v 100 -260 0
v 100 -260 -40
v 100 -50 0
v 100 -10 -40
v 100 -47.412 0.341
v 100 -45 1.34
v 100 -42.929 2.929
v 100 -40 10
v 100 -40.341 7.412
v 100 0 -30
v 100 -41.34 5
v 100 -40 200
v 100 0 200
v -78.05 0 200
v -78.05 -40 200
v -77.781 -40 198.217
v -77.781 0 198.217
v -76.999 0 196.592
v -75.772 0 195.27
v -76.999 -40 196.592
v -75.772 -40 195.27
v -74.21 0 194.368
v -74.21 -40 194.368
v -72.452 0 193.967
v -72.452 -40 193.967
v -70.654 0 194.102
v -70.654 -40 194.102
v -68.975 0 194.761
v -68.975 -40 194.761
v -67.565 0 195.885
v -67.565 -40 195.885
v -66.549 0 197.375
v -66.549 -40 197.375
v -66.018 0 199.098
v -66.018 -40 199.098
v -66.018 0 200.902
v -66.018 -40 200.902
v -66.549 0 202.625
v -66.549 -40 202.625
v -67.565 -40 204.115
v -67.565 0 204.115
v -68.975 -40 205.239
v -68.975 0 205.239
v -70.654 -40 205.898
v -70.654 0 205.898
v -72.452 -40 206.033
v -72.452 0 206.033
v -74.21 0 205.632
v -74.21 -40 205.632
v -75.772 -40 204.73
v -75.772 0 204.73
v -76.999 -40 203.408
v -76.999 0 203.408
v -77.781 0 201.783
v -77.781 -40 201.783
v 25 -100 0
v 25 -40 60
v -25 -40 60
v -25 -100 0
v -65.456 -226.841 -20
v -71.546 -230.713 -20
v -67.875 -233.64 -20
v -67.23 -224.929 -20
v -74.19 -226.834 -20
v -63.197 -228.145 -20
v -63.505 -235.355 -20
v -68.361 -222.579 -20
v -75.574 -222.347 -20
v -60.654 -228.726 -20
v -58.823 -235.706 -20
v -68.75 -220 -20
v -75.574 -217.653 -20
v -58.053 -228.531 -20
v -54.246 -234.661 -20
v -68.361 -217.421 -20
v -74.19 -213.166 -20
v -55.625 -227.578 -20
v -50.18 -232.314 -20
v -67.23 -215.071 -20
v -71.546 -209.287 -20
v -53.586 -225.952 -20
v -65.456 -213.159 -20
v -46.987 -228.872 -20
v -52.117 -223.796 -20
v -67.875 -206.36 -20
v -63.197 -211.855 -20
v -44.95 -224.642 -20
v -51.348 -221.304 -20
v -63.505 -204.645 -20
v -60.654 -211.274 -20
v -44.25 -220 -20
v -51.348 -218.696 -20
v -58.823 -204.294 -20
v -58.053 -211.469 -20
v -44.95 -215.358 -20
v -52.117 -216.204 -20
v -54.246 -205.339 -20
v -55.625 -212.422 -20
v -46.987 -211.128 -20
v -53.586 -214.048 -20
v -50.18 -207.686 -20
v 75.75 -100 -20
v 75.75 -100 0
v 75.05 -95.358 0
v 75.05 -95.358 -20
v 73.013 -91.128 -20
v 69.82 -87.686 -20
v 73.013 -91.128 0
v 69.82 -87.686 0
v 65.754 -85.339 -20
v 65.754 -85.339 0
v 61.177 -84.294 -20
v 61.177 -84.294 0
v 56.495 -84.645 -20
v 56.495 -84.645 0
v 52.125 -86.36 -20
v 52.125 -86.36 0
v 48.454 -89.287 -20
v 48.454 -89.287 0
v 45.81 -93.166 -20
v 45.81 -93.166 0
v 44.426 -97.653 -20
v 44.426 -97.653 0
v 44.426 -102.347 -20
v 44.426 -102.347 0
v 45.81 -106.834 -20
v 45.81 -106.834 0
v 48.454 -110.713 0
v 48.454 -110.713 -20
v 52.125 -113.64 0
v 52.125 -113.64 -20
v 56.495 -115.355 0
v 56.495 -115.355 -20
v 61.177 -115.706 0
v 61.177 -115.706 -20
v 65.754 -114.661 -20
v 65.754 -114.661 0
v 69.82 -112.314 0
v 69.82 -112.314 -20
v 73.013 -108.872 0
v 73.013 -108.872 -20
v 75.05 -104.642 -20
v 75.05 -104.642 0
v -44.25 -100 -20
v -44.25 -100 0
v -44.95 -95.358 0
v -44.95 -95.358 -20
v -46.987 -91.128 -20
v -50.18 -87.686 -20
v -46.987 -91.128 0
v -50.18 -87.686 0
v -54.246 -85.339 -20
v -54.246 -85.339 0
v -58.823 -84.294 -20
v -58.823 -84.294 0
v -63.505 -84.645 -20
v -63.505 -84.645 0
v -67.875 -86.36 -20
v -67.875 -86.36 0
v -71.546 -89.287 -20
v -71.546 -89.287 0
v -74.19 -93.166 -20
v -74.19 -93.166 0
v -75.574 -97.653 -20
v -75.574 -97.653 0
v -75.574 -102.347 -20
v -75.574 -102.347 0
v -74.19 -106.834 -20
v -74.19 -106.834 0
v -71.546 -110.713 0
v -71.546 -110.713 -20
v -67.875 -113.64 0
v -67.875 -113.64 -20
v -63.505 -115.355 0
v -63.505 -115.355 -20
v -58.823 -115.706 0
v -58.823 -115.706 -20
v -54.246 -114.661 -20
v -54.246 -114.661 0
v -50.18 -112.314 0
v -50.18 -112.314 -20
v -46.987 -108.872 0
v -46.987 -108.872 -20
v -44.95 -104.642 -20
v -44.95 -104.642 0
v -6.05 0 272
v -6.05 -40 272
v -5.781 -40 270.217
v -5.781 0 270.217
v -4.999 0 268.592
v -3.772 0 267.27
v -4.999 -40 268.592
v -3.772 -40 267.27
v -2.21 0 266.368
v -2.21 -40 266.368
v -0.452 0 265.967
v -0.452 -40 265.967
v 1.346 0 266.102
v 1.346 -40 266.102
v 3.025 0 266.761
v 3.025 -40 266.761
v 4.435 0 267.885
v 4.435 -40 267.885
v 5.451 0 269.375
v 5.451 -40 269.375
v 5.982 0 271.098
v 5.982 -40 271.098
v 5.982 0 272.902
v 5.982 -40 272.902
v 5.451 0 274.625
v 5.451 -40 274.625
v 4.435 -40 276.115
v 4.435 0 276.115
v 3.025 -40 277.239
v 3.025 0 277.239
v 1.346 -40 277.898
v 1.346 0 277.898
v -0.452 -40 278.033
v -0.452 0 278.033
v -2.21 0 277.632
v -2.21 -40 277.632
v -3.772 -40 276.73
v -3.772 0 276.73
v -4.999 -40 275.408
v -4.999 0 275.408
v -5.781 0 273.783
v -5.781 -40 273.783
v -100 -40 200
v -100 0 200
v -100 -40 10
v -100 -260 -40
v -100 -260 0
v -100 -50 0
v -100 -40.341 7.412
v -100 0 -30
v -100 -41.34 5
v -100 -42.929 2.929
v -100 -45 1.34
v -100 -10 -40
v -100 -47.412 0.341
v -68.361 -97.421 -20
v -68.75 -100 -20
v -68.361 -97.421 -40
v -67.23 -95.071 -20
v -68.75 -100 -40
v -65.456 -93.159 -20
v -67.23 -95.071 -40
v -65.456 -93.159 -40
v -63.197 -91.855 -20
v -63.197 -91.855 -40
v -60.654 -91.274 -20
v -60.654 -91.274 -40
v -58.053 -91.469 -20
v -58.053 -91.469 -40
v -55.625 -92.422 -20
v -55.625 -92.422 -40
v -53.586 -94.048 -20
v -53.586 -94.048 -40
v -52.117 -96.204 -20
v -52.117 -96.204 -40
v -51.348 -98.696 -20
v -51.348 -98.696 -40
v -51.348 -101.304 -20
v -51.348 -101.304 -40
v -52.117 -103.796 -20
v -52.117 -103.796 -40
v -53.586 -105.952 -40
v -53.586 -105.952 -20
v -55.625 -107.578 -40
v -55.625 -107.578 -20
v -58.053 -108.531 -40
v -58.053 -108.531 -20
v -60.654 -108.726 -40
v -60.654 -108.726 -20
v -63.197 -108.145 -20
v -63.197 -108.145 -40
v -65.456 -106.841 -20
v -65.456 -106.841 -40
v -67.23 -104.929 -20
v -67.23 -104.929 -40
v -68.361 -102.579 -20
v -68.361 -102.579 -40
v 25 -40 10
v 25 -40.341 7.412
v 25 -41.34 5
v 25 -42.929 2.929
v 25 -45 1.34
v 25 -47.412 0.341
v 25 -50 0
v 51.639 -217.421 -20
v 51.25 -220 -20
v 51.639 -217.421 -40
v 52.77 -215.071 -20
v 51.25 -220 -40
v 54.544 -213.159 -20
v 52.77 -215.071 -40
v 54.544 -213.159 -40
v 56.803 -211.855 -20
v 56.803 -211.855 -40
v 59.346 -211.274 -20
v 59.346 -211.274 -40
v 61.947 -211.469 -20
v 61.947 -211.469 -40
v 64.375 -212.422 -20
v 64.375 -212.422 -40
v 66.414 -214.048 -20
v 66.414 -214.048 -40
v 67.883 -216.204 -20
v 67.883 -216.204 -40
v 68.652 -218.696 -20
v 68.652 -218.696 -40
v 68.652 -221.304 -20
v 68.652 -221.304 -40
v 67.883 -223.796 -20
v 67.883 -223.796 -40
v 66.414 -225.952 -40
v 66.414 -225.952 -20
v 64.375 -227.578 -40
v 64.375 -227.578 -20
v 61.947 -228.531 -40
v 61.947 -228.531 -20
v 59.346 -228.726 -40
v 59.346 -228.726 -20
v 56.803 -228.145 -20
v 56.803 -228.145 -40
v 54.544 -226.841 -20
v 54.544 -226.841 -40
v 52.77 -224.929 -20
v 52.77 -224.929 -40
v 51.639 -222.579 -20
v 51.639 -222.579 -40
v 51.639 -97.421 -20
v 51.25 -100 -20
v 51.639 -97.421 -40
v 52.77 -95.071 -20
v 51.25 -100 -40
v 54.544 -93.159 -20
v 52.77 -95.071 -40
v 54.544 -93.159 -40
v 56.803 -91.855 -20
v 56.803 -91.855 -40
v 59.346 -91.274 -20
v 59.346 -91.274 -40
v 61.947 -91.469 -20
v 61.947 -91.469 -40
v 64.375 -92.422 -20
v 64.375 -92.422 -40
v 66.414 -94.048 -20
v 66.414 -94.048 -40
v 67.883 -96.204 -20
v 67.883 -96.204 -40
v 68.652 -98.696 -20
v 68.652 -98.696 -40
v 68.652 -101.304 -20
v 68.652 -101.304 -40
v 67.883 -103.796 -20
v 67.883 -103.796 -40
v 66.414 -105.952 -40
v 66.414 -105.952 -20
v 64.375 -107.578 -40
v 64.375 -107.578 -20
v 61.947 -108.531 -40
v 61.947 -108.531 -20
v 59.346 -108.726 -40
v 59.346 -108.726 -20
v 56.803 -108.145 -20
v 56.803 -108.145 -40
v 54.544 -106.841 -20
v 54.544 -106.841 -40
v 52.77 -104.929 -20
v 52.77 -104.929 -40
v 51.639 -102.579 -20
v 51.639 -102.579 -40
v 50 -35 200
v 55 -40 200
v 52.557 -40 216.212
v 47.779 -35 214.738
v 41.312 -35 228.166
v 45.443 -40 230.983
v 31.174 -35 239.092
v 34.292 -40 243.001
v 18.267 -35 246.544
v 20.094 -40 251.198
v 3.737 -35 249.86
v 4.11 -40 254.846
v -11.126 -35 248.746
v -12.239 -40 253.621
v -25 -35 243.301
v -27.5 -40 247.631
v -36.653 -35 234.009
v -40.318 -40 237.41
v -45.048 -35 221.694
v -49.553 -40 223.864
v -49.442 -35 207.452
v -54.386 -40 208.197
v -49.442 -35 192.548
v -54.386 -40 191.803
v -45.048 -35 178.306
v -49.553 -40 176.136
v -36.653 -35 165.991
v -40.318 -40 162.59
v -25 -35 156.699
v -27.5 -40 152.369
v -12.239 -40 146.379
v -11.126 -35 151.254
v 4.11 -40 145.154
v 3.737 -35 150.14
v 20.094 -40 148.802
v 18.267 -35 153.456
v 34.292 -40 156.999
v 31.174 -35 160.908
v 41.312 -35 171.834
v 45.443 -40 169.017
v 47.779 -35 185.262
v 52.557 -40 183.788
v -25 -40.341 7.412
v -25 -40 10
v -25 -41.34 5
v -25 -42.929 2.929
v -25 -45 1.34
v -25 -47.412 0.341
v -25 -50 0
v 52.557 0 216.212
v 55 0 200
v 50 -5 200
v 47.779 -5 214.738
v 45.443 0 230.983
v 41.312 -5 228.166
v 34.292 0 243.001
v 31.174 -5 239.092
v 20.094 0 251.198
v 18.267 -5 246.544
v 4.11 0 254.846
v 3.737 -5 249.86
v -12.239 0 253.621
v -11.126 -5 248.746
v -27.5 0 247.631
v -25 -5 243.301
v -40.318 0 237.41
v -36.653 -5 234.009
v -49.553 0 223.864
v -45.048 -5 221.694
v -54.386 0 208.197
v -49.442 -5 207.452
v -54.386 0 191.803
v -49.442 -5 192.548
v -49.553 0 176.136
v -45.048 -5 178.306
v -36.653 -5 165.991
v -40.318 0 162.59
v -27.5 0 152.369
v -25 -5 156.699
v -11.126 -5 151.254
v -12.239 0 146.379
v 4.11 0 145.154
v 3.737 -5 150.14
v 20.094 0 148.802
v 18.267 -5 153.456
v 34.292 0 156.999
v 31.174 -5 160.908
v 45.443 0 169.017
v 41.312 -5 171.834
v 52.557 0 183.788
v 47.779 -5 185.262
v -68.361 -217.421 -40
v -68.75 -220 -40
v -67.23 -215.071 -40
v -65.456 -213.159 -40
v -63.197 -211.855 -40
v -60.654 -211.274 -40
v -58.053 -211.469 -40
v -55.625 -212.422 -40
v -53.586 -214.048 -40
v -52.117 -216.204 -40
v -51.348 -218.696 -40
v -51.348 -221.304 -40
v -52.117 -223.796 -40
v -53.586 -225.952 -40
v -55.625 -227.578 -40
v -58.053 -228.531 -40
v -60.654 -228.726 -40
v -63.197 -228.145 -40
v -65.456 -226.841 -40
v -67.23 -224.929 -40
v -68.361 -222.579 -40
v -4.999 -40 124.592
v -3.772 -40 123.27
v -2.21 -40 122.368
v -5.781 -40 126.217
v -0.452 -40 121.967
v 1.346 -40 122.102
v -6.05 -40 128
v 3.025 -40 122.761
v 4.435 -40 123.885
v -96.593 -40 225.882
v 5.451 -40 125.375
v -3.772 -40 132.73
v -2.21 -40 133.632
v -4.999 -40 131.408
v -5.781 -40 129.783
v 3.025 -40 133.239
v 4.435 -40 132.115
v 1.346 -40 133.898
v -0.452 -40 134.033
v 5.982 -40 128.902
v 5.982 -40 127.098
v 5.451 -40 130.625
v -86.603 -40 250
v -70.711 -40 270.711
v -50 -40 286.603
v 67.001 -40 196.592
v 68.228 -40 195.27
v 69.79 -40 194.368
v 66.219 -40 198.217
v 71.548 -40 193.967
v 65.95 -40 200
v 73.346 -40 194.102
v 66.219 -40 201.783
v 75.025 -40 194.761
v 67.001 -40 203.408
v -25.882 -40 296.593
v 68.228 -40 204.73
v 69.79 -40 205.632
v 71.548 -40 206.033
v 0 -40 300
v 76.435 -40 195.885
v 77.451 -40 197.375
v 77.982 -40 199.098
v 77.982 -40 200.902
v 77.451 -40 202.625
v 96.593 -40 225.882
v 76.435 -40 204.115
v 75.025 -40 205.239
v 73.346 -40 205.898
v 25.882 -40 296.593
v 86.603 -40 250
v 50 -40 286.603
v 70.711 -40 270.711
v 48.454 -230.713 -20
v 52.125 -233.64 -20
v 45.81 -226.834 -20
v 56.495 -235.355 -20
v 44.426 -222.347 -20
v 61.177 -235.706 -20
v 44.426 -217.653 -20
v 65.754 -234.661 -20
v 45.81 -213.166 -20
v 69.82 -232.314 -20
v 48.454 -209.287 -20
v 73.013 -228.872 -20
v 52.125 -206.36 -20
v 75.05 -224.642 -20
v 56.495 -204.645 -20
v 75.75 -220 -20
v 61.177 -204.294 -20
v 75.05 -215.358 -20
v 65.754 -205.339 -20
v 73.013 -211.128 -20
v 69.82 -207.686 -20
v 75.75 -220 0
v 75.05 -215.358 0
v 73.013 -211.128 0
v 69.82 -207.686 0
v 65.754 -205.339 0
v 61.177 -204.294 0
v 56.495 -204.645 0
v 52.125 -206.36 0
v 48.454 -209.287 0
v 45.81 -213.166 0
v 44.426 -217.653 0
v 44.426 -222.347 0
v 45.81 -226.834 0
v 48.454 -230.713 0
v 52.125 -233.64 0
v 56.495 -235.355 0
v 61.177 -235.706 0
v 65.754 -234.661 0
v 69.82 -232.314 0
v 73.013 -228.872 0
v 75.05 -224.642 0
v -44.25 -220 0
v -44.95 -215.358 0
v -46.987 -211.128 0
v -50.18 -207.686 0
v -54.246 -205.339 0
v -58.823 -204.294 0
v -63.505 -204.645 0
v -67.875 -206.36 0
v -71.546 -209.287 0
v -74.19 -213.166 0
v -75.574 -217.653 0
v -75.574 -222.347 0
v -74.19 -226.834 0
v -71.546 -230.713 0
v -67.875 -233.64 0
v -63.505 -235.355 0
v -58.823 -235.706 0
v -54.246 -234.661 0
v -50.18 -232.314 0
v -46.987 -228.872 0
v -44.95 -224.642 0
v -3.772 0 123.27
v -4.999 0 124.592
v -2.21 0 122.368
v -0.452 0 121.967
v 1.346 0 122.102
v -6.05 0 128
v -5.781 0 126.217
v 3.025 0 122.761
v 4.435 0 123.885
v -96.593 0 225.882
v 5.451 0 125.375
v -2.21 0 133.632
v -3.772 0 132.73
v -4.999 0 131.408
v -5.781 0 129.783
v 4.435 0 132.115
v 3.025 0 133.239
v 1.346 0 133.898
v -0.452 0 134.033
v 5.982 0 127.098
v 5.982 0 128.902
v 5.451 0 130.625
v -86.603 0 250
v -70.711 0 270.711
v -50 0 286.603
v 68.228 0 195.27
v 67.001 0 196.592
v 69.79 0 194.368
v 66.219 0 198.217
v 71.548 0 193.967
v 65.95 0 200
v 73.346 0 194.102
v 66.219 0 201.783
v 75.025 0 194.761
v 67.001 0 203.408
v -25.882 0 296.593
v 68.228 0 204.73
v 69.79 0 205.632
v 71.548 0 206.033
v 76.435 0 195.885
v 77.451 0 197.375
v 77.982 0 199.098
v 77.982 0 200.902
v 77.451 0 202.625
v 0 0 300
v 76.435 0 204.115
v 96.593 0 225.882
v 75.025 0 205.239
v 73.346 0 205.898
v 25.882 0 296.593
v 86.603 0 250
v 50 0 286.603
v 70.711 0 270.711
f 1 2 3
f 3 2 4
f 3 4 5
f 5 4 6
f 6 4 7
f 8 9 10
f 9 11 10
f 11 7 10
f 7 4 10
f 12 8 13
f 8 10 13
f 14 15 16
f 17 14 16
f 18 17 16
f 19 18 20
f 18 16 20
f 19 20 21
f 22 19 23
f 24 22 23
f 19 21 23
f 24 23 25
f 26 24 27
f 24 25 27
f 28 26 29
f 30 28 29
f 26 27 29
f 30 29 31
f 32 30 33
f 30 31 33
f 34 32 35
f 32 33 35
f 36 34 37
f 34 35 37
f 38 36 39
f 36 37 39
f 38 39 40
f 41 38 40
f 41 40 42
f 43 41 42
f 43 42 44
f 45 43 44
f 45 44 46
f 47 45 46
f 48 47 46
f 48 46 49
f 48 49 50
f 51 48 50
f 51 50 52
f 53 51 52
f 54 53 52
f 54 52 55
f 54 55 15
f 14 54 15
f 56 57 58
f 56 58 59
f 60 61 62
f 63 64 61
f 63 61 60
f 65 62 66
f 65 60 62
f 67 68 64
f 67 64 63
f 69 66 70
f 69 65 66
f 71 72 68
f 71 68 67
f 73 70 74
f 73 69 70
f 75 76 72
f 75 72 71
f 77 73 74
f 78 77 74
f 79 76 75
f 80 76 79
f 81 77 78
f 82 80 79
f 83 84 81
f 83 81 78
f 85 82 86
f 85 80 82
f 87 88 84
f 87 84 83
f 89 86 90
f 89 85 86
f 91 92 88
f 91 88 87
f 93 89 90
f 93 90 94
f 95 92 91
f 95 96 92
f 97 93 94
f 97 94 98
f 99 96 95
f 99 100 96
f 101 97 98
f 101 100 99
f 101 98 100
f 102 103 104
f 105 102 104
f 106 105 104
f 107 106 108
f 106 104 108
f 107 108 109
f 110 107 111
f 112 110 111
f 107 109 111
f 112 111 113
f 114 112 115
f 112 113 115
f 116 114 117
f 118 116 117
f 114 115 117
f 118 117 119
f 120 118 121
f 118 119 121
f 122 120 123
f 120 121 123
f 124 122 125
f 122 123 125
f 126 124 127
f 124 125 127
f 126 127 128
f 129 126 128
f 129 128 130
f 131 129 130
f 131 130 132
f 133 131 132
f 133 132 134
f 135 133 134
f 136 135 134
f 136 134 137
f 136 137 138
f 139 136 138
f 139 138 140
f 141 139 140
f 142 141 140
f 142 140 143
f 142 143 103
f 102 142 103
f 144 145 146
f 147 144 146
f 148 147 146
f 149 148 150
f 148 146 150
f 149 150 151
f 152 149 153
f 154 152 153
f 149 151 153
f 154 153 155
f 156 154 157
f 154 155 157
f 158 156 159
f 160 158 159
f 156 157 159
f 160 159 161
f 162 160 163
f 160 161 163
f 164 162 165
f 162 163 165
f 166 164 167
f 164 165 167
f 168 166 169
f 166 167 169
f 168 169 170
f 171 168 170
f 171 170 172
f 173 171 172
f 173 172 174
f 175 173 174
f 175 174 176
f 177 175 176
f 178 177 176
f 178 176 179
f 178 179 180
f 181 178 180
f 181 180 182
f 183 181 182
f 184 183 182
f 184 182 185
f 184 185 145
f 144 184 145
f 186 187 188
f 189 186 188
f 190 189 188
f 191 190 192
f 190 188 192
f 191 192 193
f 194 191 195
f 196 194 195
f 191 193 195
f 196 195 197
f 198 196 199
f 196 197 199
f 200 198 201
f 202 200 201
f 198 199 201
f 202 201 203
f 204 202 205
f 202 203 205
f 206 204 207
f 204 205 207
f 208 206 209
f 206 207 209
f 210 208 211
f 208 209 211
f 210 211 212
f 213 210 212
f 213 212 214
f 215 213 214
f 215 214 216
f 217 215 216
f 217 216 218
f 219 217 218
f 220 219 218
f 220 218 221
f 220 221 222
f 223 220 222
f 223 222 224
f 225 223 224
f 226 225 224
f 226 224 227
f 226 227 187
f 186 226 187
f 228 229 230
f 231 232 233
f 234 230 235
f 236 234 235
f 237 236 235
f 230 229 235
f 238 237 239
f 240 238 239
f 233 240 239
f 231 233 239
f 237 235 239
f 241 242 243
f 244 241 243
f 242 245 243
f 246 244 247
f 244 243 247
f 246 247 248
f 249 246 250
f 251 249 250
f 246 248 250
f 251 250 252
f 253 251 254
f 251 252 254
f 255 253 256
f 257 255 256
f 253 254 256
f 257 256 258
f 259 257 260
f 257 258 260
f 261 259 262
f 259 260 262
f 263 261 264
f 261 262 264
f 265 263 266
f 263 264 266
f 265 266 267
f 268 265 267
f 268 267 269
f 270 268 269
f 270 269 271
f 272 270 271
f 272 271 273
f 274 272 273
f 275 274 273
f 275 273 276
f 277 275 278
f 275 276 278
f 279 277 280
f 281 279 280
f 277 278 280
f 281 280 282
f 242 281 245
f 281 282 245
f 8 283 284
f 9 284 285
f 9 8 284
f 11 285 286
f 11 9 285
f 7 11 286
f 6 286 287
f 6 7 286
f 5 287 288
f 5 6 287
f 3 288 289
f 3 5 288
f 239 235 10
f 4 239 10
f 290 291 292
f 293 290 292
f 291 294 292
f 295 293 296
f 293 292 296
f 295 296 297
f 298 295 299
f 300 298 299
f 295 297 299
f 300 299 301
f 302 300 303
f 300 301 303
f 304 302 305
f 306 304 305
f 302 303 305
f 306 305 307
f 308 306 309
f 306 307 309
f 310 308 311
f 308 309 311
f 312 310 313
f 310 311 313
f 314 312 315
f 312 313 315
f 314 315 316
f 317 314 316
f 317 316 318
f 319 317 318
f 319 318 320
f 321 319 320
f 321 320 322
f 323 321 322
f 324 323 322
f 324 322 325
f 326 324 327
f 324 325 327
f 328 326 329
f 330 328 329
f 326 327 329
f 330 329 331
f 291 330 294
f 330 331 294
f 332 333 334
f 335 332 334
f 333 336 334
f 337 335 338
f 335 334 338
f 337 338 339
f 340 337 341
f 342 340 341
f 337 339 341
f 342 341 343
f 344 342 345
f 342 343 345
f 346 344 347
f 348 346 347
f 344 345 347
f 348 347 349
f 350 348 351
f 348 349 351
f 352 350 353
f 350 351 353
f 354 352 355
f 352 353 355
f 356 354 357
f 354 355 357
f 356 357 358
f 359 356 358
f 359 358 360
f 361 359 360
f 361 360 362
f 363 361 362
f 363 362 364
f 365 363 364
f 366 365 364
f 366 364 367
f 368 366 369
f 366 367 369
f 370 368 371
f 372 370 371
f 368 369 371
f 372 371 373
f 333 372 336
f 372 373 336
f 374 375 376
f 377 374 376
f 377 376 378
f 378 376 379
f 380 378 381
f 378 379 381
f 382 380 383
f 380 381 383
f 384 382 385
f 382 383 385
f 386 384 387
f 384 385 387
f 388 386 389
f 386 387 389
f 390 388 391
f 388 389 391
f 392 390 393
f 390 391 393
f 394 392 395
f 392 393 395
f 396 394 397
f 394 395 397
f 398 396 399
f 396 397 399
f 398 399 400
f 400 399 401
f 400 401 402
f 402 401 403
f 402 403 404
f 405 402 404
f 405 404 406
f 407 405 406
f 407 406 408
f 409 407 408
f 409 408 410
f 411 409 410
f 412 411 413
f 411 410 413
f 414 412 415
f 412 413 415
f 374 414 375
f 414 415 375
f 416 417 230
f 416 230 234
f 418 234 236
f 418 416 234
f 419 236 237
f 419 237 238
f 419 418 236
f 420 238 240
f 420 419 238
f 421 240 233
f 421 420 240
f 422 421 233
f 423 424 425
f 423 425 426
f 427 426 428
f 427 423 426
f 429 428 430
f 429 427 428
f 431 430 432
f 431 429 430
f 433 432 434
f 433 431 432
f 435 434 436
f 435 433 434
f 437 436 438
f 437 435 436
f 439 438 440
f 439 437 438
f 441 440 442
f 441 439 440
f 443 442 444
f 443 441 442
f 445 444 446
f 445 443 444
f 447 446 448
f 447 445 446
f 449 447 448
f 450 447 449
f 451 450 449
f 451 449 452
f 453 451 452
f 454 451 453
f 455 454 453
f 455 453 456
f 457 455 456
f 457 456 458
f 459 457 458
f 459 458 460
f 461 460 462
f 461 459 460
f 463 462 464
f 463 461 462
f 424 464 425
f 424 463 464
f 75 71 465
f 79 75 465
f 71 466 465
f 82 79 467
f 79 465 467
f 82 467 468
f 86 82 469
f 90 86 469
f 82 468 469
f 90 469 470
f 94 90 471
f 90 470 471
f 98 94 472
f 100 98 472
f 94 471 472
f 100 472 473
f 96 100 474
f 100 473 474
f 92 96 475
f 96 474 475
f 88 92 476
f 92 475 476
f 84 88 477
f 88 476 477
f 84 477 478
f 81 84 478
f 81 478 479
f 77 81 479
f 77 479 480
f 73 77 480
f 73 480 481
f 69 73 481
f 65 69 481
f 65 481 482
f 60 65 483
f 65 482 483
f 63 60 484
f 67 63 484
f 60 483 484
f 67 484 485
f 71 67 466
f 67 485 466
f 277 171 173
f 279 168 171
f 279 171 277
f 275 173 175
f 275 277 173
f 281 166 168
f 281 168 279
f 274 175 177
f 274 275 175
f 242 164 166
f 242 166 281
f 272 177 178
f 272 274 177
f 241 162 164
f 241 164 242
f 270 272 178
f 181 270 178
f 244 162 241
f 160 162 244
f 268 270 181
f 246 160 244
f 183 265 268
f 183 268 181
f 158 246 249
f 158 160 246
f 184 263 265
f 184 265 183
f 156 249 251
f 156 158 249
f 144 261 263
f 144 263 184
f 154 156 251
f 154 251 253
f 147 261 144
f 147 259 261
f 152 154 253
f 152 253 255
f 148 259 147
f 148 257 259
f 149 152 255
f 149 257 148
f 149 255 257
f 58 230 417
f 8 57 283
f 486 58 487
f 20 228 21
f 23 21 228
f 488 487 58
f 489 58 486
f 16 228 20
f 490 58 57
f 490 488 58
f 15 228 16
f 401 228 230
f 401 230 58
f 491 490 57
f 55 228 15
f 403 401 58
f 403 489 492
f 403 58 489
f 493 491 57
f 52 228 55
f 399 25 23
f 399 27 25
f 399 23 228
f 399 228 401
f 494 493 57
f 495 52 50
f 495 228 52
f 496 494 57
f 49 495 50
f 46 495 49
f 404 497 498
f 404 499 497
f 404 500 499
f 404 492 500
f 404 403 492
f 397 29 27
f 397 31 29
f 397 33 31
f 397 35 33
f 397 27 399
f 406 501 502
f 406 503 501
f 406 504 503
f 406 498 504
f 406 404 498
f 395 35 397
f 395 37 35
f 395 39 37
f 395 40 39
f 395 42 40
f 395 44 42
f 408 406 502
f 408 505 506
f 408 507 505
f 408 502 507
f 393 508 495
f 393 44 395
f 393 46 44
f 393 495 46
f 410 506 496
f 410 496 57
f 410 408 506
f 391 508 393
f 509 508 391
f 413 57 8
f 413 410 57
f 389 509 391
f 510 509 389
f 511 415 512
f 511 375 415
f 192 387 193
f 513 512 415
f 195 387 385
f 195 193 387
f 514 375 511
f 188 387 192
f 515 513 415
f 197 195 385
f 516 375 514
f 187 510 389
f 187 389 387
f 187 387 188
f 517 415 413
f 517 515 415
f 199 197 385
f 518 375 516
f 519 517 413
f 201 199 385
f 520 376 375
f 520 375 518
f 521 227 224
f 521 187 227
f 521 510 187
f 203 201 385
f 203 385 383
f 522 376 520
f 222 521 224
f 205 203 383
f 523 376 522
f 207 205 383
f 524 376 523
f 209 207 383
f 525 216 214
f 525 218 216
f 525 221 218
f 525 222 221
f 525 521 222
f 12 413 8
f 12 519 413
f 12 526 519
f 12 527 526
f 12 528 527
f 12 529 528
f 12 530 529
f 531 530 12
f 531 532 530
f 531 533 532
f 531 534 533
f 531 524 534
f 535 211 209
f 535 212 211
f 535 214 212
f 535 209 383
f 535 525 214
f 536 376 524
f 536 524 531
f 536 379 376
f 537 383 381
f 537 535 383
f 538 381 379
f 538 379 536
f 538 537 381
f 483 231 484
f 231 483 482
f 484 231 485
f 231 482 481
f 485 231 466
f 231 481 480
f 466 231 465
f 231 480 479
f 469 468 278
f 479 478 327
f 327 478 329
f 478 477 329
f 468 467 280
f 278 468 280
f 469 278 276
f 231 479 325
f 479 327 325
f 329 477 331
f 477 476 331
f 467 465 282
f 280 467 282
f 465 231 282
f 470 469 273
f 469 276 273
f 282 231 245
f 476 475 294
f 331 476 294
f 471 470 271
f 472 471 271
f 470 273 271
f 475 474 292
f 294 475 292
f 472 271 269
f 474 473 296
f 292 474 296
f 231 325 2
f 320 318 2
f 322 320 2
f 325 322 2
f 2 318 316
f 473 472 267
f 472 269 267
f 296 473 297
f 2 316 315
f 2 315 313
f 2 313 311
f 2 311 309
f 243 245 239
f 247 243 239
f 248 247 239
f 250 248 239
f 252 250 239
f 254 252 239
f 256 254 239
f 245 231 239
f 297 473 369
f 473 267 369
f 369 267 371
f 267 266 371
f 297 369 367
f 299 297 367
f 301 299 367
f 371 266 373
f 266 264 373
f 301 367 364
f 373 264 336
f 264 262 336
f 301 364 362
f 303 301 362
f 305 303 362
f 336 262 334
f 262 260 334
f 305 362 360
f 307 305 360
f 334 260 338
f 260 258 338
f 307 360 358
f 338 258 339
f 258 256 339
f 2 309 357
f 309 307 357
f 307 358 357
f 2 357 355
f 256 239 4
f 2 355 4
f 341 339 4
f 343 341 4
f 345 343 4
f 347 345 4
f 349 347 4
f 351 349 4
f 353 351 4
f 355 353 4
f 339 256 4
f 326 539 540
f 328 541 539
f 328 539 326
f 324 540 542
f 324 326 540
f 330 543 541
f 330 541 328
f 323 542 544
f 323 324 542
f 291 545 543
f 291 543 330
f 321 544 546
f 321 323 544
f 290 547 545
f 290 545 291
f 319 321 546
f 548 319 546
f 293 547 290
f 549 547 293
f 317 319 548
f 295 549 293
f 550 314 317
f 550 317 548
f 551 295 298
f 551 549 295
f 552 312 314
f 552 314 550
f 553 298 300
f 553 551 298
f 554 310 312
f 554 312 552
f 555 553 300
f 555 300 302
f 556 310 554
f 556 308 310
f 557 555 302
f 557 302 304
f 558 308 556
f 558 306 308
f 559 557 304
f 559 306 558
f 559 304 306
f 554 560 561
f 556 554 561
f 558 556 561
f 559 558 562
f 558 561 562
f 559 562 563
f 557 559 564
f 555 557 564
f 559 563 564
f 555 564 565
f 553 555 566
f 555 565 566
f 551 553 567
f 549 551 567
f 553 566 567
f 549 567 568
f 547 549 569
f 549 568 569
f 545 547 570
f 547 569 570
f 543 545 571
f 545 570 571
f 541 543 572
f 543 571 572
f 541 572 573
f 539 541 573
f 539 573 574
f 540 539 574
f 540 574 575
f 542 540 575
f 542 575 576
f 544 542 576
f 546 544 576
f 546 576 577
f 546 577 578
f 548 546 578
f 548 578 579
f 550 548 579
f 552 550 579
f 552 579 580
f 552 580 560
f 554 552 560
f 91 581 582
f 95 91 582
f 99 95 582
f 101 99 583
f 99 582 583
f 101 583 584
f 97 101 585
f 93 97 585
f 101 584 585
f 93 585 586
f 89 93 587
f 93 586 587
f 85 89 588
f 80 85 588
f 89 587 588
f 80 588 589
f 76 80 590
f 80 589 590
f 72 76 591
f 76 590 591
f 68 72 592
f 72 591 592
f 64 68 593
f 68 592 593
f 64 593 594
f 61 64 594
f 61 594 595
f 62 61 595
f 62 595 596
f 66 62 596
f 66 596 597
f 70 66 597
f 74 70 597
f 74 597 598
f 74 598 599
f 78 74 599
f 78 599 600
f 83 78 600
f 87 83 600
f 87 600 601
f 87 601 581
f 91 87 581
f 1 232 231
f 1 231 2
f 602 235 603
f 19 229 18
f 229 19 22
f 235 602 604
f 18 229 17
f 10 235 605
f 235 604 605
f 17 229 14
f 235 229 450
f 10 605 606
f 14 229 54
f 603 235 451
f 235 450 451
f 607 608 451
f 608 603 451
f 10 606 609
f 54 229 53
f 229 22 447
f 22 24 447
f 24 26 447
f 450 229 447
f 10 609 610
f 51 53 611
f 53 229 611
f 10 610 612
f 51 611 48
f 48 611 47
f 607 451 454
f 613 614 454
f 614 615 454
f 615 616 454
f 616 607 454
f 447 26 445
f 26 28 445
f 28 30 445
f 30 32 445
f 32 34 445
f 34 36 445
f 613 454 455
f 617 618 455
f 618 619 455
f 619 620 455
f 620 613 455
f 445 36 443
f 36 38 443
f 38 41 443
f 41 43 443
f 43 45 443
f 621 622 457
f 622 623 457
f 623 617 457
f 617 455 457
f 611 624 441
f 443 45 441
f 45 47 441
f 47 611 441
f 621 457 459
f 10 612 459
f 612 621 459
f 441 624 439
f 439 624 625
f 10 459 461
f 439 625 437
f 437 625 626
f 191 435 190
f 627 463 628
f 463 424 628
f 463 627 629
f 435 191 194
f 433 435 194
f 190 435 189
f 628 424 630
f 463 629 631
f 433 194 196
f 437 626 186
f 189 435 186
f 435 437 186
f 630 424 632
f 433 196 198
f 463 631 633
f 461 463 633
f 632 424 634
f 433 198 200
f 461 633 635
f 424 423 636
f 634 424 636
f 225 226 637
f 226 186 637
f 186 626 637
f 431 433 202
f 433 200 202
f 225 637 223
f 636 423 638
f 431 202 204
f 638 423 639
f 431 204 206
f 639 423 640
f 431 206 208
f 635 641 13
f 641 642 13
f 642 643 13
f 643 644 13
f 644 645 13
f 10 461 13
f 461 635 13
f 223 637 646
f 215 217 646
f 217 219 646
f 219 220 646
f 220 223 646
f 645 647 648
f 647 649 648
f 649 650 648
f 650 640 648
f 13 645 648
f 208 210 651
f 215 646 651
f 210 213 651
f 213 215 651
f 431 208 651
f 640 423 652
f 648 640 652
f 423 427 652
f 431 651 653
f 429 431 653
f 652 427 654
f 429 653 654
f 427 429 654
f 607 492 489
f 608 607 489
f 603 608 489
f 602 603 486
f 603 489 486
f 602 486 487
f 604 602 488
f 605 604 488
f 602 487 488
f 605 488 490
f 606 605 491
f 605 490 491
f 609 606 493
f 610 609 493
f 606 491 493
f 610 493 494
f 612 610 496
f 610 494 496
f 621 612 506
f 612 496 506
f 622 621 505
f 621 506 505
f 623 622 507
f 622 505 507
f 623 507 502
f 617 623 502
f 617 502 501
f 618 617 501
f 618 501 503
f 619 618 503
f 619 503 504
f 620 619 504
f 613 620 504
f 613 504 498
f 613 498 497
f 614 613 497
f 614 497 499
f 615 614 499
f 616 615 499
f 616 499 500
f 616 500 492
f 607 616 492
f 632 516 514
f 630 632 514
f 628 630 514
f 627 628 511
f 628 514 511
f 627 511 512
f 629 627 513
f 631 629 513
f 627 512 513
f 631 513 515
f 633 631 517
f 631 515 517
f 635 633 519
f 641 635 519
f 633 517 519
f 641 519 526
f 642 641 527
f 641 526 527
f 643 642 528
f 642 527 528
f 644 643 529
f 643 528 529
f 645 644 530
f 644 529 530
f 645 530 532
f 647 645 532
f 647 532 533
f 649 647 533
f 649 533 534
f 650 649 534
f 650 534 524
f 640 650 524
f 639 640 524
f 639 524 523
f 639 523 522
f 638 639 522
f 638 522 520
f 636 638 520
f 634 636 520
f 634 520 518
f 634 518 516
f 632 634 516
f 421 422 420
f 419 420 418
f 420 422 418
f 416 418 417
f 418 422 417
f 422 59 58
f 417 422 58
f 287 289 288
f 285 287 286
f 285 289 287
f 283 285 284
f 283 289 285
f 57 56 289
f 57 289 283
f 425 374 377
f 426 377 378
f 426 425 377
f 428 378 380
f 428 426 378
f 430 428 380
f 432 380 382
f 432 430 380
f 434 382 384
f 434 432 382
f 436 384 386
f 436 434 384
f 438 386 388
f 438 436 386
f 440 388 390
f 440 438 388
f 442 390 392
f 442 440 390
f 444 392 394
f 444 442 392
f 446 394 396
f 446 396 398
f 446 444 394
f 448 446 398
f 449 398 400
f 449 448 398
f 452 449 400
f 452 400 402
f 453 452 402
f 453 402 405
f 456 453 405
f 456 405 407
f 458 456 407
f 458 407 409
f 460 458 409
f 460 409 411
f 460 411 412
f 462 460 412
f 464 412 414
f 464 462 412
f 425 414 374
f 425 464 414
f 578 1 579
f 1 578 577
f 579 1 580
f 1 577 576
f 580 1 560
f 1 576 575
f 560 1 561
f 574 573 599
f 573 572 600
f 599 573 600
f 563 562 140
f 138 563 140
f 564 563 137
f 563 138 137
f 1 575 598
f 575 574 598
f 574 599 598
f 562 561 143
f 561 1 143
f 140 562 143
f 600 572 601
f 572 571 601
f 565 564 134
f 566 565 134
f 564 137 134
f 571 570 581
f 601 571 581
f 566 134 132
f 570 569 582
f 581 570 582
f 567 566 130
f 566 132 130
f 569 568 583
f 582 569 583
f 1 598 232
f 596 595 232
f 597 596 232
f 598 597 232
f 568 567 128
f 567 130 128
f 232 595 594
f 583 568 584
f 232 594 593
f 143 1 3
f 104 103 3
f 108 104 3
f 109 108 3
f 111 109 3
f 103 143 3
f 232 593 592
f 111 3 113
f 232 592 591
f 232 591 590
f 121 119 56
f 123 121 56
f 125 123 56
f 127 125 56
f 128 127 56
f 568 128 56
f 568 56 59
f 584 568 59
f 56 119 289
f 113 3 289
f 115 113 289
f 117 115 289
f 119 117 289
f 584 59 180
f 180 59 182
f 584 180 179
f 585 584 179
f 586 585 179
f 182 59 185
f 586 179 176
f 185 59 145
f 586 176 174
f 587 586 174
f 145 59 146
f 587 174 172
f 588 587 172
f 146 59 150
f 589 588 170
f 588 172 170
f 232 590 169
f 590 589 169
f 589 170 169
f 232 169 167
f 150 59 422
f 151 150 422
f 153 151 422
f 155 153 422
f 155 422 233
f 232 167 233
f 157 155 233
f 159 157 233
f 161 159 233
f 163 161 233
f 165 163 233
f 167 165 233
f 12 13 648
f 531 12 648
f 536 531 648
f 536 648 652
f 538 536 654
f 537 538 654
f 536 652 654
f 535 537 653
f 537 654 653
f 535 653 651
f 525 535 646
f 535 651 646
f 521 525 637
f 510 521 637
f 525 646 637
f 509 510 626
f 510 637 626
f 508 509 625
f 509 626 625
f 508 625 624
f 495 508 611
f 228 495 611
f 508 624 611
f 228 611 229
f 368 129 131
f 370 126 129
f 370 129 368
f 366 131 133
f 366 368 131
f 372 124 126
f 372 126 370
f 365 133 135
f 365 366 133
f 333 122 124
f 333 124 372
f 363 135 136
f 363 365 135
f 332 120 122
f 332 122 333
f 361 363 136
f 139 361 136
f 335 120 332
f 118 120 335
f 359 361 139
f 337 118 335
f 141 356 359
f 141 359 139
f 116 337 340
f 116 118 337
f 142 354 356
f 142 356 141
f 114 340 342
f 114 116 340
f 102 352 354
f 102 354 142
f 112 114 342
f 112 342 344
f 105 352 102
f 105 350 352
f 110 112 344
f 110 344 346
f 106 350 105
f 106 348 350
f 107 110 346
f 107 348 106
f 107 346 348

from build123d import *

# Parameters (mm, degrees)
F0_R            = 50
F1_DEPTH        = 40
F2_SIZE         = 5
F3_D            = 12.1
F4_DEPTH        = 260
F5_R            = 10
F6_SIZE         = 10
F8_DEPTH        = 25
F10_D           = 17.5
F10_CBORE_D     = 31.5
F10_CBORE_DEPTH = 20


with BuildPart() as f1:
    # F0 (on Front) → F1 (new body)
    with BuildSketch(Plane.XZ):
        with BuildLine():
            Line((-100, 0), (0, 0))
            Line((0, 0), (100, 0))
            Line((100, 0), (100, 200))
            ThreePointArc((100, 200), (0, 300), (-100, 200))
            Line((-100, 200), (-100, 0))
        make_face()
        with Locations((0, 200)):
            Circle(F0_R, mode=Mode.SUBTRACT)
        Polygon((100, 0), (0, 0), (-100, 0), (-100, -40), (100, -40), align=None)
    extrude(amount=F1_DEPTH)

    # F2
    f2_edges = [f1.edges().sort_by_distance(p)[0] for p in [
        (50, -20, 200),
        (-50, 0, 200),
        (-50, -40, 200),
    ]]
    chamfer(f2_edges, length=F2_SIZE)

    # F3 (through all)
    with Locations(Plane(origin=(0, 0, 0), x_dir=(1, 0, 0), z_dir=(0, 1, 0))):
        with Locations((0, -272), (72, -200), (0, -128), (-72, -200)):
            Hole(F3_D / 2)

    # F0 (on Front) → F4 (join)
    with BuildSketch(Plane.XZ):
        Polygon((100, 0), (0, 0), (-100, 0), (-100, -40), (100, -40), align=None)
    extrude(amount=F4_DEPTH)

    # F5
    f5_edges = [f1.edges().sort_by_distance(p)[0] for p in [
        (0, -40, 0),
    ]]
    fillet(f5_edges, radius=F5_R)

    # F6
    f6_edges = [f1.edges().sort_by_distance(p)[0] for p in [
        (0, 0, -40),
    ]]
    chamfer(f6_edges, length=F6_SIZE)

    # F7 (on Right) → F8 (join, symmetric)
    with BuildSketch(Plane.YZ):
        with BuildLine():
            ThreePointArc((-50, 0), (-42.9289321881, 2.9289321881), (-40, 10))
            Line((-40, 10), (-40, 60))
            Line((-40, 60), (-100, 0))
            Line((-100, 0), (-50, 0))
        make_face()
    extrude(amount=F8_DEPTH, both=True)

    # F10 (through all)
    with Locations(Plane.XY):
        with Locations((-60, -100), (60, -100), (60, -220), (-60, -220)):
            CounterBoreHole(F10_D / 2, F10_CBORE_D / 2, F10_CBORE_DEPTH)


solid = f1.part
